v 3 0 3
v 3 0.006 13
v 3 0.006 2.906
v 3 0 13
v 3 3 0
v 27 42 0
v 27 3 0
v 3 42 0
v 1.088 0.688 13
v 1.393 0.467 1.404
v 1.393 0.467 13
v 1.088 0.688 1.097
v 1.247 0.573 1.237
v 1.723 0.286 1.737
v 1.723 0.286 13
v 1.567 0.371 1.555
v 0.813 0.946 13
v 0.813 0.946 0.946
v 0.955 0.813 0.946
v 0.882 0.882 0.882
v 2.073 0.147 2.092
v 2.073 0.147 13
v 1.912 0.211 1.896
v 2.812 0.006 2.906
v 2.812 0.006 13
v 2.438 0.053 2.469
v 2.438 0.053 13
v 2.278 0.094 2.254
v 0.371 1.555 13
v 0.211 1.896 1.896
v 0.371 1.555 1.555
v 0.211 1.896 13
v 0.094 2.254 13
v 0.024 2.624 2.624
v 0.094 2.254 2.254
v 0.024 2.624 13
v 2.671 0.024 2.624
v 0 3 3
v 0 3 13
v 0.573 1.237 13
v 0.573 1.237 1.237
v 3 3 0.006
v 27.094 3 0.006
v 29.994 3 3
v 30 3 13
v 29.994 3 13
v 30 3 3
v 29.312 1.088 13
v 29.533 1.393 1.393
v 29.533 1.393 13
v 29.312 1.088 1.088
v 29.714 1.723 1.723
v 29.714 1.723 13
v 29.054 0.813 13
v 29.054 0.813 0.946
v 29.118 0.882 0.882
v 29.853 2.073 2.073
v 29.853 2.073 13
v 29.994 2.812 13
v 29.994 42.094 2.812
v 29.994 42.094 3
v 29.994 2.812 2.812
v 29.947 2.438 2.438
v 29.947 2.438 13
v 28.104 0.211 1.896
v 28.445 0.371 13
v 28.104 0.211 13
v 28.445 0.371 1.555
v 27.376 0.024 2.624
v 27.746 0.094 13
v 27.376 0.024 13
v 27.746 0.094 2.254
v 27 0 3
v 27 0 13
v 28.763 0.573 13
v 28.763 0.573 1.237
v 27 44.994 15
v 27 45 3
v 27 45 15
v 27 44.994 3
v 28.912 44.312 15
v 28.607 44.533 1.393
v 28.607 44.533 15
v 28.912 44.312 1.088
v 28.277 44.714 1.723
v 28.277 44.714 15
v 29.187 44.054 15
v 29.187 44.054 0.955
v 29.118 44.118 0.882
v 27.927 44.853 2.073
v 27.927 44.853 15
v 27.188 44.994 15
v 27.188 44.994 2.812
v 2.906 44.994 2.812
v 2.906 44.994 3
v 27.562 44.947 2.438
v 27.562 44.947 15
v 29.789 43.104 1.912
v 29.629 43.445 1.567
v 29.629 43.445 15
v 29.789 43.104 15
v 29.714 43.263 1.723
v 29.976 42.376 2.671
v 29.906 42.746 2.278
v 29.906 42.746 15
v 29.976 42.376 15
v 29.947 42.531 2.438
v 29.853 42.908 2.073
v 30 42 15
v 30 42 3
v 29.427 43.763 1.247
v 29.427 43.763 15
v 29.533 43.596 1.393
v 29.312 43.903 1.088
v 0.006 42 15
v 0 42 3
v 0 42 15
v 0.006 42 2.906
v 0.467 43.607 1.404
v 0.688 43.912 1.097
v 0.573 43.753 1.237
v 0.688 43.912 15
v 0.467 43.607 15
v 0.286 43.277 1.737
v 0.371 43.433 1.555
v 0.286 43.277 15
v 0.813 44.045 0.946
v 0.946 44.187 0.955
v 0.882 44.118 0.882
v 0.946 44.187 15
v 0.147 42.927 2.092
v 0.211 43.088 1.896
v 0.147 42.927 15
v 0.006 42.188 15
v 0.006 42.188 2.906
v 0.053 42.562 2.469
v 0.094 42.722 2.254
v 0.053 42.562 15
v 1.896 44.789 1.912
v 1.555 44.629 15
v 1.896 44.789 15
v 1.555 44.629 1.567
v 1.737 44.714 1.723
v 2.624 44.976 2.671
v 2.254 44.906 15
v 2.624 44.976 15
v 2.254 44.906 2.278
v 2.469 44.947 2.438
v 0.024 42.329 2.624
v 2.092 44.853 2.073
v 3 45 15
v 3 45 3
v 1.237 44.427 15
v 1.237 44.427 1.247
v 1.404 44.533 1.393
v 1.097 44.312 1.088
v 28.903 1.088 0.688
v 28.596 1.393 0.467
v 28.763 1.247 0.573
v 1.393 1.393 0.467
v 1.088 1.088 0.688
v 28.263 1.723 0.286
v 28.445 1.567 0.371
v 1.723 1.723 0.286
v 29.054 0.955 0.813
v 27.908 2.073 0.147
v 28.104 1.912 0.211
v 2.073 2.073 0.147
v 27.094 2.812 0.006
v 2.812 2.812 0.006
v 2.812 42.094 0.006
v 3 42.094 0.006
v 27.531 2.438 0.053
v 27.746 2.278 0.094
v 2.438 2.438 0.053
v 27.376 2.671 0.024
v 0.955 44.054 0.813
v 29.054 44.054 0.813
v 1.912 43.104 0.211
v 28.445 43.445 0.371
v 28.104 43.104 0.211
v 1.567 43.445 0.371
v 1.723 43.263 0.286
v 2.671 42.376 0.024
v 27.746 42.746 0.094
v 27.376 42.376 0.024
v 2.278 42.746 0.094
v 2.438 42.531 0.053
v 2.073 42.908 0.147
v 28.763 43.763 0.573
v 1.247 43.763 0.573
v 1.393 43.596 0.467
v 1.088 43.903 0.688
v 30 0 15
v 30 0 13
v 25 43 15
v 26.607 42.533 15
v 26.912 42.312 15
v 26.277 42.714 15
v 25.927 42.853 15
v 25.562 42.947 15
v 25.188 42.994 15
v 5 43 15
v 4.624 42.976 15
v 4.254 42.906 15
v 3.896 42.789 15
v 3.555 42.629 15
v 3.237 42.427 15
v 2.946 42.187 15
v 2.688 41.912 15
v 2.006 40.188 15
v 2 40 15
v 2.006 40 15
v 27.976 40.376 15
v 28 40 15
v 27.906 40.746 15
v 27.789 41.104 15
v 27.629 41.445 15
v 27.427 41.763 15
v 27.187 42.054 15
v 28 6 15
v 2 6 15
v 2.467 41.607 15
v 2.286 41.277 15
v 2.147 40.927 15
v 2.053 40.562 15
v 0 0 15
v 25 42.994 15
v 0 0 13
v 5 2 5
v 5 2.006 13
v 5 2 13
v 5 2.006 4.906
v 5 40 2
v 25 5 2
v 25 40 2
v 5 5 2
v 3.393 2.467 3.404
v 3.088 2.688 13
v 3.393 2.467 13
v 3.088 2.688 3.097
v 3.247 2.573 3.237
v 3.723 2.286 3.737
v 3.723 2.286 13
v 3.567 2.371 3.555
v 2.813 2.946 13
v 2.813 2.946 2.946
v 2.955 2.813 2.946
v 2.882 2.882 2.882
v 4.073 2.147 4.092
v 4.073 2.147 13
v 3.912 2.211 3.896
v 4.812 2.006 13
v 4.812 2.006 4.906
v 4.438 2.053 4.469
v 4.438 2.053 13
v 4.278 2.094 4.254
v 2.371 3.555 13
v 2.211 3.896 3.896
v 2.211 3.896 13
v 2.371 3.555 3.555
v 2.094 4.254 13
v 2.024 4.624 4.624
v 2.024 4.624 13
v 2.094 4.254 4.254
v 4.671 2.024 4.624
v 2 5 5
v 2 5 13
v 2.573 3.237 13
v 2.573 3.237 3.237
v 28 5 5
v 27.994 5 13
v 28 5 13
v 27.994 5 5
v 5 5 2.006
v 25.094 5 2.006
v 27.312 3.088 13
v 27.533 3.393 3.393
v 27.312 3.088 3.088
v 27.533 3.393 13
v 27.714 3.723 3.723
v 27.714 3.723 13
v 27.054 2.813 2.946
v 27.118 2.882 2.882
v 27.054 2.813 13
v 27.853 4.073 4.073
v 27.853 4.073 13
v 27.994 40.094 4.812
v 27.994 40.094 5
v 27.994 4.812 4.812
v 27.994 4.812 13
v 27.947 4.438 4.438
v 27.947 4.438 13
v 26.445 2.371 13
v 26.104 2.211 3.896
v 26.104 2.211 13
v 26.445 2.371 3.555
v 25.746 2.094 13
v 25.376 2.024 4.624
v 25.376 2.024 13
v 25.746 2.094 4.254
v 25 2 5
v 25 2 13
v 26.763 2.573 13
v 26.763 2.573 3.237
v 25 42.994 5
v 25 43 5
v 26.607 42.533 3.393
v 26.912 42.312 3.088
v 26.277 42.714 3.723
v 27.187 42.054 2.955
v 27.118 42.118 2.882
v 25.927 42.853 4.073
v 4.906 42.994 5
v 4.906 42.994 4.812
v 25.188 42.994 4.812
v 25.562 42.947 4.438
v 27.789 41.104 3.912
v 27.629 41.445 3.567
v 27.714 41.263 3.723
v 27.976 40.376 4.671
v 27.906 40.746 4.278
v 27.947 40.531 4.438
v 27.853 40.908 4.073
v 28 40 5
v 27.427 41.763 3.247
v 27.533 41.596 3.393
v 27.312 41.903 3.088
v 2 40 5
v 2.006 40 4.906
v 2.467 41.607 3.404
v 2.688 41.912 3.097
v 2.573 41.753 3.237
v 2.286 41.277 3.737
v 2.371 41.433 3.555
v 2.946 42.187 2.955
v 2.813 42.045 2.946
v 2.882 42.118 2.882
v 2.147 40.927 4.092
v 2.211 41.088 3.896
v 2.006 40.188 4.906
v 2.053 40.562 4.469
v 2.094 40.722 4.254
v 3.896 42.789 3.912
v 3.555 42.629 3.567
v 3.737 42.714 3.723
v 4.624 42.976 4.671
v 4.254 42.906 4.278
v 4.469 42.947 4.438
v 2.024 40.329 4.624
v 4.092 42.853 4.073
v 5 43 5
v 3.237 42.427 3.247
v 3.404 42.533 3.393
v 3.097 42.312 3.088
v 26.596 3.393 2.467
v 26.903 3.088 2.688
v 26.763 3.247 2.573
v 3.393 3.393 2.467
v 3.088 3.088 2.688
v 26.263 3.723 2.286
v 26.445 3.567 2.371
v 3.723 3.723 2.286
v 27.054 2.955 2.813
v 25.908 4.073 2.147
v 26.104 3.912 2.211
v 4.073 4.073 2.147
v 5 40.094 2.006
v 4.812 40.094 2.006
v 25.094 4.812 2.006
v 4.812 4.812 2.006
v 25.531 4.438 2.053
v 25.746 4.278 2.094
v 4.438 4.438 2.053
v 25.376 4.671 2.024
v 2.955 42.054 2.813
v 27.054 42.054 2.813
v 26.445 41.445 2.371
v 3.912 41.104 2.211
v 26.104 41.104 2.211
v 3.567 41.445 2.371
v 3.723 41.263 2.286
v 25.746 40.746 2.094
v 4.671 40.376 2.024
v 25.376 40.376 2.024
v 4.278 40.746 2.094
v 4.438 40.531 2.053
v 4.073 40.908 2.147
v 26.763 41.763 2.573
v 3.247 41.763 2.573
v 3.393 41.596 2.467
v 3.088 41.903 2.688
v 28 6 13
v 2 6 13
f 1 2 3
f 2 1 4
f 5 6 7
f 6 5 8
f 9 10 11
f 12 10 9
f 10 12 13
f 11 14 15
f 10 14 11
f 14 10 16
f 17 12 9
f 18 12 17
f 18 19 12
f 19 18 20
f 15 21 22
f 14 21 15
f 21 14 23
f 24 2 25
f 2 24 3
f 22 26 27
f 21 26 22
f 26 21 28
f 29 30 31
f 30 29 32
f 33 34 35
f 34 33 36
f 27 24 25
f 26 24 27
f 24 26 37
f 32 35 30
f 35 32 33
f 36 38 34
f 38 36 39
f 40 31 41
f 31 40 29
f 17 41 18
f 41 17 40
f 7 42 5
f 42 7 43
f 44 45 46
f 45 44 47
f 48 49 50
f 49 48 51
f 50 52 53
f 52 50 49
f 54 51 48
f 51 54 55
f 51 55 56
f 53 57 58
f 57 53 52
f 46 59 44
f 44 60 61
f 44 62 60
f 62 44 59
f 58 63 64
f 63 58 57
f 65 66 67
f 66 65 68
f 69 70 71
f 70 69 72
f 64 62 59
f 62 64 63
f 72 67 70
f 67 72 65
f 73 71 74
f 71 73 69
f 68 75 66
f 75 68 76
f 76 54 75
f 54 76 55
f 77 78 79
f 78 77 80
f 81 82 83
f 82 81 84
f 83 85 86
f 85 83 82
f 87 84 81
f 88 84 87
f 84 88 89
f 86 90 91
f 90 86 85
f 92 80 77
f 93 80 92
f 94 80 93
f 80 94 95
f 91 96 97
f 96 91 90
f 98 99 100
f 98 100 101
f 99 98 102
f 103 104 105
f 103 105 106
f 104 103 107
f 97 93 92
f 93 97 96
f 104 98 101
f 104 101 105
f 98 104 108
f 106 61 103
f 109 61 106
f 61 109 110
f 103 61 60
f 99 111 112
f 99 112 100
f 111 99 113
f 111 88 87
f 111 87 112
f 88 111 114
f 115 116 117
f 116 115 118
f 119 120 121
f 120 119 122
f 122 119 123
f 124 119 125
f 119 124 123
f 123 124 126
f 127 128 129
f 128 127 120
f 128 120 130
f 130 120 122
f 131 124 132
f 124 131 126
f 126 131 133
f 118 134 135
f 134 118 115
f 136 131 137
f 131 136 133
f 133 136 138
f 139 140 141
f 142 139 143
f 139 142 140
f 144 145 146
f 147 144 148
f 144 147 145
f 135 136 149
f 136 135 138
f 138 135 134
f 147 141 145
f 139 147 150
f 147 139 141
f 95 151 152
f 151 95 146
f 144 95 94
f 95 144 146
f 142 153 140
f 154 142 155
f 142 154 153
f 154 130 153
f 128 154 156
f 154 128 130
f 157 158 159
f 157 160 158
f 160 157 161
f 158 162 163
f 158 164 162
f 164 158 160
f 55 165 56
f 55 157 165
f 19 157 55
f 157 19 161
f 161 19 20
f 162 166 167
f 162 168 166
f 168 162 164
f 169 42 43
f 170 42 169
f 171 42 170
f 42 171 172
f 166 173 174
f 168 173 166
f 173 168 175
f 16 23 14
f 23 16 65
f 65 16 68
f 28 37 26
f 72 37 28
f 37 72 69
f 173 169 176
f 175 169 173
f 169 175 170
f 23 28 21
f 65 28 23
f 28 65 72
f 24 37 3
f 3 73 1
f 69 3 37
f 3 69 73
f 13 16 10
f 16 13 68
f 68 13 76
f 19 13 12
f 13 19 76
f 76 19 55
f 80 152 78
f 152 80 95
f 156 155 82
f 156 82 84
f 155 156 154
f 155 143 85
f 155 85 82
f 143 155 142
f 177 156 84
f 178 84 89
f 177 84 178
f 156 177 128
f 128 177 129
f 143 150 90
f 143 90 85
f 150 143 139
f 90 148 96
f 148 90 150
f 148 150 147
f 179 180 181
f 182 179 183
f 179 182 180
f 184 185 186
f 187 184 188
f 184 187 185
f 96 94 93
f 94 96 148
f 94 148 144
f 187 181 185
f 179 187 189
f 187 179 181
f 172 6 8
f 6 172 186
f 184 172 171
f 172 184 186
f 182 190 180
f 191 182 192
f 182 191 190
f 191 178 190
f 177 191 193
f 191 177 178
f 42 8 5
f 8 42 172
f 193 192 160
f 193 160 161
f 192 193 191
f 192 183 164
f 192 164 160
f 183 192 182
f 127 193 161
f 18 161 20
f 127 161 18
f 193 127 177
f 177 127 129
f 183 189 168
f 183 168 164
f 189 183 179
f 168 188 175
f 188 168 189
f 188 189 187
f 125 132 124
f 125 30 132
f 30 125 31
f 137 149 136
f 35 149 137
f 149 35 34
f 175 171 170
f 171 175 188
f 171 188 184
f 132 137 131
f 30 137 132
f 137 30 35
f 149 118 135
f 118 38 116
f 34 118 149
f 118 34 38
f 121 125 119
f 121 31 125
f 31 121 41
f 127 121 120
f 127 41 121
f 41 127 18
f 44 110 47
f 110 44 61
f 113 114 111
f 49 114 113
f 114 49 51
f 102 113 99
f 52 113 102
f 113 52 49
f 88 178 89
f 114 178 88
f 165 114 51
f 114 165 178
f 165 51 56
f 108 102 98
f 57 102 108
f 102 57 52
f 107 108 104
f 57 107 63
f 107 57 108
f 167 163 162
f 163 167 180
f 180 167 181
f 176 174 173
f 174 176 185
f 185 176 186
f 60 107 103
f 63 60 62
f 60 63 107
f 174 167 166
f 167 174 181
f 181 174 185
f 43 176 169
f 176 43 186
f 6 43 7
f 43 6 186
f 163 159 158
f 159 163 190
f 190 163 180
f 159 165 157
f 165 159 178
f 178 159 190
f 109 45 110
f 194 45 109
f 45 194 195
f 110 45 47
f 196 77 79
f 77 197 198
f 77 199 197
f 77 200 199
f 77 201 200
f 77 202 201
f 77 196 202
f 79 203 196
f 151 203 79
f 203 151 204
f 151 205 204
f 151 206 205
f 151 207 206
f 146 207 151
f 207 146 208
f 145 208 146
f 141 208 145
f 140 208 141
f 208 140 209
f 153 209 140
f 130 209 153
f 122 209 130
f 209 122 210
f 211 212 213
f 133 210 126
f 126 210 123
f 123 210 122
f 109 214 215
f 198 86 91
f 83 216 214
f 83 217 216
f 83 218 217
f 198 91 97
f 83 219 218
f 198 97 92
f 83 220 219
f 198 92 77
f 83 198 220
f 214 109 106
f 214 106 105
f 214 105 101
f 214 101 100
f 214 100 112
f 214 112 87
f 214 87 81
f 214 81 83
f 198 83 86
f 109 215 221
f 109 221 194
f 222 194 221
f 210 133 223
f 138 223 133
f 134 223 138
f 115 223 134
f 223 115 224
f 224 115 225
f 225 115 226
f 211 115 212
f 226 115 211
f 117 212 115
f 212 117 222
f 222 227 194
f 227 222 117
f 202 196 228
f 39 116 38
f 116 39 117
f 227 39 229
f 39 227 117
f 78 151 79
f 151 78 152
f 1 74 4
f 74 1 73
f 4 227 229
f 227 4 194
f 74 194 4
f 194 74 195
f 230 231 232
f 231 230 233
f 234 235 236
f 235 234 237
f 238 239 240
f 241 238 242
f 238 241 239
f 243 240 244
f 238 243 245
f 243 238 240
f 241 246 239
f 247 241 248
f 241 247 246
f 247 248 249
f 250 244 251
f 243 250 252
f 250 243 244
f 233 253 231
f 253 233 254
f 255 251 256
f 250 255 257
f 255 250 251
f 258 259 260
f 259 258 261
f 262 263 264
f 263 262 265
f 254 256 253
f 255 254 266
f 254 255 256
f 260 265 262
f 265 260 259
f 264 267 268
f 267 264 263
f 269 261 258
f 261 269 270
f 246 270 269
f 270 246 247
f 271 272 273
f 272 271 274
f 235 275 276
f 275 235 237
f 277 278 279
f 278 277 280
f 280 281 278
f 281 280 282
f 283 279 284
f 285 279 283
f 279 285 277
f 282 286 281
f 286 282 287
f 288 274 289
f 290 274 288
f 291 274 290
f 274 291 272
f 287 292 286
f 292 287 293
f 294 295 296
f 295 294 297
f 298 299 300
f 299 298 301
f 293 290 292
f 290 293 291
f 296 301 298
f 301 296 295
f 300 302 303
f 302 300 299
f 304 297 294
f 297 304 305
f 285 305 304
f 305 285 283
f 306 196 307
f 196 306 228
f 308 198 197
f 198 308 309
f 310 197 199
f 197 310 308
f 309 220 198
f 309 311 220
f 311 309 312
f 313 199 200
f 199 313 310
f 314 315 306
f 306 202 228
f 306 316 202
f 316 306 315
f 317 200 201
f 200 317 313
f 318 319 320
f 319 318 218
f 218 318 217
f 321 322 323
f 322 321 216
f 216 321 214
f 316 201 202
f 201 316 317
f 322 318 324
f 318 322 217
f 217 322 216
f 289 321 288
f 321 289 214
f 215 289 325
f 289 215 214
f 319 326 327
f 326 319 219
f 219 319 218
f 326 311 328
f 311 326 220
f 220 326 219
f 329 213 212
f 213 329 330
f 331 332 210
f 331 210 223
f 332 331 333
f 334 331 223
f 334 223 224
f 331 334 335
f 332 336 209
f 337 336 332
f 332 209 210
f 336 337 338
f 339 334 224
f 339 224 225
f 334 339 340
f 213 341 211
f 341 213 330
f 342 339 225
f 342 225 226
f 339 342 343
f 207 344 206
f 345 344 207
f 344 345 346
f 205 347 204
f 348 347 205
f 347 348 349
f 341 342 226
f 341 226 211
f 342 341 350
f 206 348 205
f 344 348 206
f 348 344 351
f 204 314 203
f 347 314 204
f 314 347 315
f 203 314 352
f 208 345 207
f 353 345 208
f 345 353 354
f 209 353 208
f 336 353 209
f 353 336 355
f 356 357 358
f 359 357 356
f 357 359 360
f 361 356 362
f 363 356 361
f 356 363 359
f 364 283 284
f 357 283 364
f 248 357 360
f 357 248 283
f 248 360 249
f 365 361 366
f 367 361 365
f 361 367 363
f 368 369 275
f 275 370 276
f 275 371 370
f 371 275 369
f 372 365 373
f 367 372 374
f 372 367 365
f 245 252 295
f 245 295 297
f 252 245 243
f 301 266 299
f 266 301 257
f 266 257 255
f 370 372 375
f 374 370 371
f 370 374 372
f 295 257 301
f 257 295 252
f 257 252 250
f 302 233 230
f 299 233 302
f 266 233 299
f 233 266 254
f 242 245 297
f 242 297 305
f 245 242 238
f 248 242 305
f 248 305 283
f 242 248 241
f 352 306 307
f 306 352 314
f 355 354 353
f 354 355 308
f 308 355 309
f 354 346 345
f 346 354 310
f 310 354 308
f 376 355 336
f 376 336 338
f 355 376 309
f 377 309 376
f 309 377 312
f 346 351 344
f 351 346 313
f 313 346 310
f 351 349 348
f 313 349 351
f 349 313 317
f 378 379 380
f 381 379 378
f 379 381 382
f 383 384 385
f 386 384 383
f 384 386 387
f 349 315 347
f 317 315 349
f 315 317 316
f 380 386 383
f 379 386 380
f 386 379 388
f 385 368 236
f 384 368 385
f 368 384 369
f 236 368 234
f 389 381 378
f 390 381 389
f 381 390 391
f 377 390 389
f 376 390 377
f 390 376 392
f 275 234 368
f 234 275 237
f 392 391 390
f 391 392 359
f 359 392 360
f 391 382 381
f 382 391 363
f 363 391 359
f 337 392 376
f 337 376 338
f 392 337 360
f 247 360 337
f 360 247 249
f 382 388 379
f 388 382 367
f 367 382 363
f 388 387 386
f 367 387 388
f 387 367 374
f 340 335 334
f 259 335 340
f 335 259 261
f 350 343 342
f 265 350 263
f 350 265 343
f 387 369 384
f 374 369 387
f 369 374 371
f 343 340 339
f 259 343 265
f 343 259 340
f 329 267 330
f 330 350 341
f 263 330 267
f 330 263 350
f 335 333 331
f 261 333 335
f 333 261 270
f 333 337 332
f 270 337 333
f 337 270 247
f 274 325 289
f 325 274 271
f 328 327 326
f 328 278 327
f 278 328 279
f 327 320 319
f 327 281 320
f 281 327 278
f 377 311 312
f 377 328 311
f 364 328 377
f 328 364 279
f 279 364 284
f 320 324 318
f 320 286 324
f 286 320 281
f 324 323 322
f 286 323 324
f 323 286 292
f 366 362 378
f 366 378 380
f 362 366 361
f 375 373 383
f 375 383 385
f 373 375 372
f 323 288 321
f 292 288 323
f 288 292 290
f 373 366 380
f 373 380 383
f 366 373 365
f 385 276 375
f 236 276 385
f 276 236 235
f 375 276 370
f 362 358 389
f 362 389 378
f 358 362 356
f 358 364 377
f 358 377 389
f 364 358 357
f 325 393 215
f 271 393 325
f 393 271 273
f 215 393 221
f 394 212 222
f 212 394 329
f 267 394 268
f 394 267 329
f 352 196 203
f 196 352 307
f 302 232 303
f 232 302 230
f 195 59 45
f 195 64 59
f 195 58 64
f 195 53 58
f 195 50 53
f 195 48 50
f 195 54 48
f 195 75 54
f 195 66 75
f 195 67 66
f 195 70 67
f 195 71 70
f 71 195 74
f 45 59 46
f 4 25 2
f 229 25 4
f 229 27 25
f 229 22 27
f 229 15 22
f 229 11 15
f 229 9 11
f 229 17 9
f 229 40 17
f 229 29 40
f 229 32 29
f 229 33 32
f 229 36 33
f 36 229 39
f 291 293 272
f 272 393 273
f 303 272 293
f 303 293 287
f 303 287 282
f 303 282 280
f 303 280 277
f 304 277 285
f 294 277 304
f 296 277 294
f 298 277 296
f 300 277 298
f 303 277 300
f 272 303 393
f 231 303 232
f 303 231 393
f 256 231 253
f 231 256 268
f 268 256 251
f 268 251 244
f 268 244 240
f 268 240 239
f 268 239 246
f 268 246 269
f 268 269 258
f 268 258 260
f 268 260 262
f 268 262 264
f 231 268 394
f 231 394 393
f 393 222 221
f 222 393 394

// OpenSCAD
$fn=50;

length = 45;
width = 30;
height = 15;
cornerRadius = 3;
thickness = 2;
lipDepth = 6;
dividerHeight = 0; //height - thickness;

translate([0, 0, 0]) {
    box(length, width, height, cornerRadius, thickness, lipDepth, dividerHeight);
}

module box(length, width, height, radius, thickness, lipDepth, dividerHeight) {
    thickness2 = 2*thickness;
    union(){
        difference() {
            boxpart(length, width, height, radius);
            translate([thickness, thickness, thickness]) 
              boxpart(length-thickness2, width-thickness2, height-thickness+0.01, radius);
        }
        if (lipDepth > 0) {
            translate([0, 0, height-thickness]) cube([width, lipDepth, thickness]);
        }
        if (dividerHeight > 0) {
            translate([0, length/2, thickness]) cube([width-thickness, thickness, dividerHeight]);
        }
    }
}

module boxpart(length, width, height, radius) {
    difference() {
        cube(size=[width, length, height]);
        // The intersection of these will give corners which are imperfect,
        // but good enough.
        rounderZ(length, width, height+0.2, radius);
        rounderXL(length, width, height, radius);
        rounderYL(length, width, height, radius);
    }
}

module rounderZ(length, width, height, radius) {
    rounder2(height, radius, width);
    translate([width, length, 0]) rotate([0, 0, 180]) rounder2(height, radius, width);
}

module rounderXL(length, width, height, radius) {
    rotate([90, 0, 90]) rounder2(width, radius, length);
}

module rounderYL(length, width, height, radius) {
    translate([0, length, 0]) rotate([90, 0, 0]) rounder2(length, radius, width);
}

module rounder2(height, radius, spacing) {
    rounder(height, radius);
    translate([spacing, 0, 0]) rotate([0, 0, 90]) rounder(height, radius);
}

module rounder(height, radius) {
    slop = 0.2;
    difference() {
        translate([-radius, -radius, 0]) cube(size=[radius*2, radius*2, height]);
        translate([radius, radius, -slop/2]) cylinder(h=height+slop, r=radius, center=false);
    }
}
